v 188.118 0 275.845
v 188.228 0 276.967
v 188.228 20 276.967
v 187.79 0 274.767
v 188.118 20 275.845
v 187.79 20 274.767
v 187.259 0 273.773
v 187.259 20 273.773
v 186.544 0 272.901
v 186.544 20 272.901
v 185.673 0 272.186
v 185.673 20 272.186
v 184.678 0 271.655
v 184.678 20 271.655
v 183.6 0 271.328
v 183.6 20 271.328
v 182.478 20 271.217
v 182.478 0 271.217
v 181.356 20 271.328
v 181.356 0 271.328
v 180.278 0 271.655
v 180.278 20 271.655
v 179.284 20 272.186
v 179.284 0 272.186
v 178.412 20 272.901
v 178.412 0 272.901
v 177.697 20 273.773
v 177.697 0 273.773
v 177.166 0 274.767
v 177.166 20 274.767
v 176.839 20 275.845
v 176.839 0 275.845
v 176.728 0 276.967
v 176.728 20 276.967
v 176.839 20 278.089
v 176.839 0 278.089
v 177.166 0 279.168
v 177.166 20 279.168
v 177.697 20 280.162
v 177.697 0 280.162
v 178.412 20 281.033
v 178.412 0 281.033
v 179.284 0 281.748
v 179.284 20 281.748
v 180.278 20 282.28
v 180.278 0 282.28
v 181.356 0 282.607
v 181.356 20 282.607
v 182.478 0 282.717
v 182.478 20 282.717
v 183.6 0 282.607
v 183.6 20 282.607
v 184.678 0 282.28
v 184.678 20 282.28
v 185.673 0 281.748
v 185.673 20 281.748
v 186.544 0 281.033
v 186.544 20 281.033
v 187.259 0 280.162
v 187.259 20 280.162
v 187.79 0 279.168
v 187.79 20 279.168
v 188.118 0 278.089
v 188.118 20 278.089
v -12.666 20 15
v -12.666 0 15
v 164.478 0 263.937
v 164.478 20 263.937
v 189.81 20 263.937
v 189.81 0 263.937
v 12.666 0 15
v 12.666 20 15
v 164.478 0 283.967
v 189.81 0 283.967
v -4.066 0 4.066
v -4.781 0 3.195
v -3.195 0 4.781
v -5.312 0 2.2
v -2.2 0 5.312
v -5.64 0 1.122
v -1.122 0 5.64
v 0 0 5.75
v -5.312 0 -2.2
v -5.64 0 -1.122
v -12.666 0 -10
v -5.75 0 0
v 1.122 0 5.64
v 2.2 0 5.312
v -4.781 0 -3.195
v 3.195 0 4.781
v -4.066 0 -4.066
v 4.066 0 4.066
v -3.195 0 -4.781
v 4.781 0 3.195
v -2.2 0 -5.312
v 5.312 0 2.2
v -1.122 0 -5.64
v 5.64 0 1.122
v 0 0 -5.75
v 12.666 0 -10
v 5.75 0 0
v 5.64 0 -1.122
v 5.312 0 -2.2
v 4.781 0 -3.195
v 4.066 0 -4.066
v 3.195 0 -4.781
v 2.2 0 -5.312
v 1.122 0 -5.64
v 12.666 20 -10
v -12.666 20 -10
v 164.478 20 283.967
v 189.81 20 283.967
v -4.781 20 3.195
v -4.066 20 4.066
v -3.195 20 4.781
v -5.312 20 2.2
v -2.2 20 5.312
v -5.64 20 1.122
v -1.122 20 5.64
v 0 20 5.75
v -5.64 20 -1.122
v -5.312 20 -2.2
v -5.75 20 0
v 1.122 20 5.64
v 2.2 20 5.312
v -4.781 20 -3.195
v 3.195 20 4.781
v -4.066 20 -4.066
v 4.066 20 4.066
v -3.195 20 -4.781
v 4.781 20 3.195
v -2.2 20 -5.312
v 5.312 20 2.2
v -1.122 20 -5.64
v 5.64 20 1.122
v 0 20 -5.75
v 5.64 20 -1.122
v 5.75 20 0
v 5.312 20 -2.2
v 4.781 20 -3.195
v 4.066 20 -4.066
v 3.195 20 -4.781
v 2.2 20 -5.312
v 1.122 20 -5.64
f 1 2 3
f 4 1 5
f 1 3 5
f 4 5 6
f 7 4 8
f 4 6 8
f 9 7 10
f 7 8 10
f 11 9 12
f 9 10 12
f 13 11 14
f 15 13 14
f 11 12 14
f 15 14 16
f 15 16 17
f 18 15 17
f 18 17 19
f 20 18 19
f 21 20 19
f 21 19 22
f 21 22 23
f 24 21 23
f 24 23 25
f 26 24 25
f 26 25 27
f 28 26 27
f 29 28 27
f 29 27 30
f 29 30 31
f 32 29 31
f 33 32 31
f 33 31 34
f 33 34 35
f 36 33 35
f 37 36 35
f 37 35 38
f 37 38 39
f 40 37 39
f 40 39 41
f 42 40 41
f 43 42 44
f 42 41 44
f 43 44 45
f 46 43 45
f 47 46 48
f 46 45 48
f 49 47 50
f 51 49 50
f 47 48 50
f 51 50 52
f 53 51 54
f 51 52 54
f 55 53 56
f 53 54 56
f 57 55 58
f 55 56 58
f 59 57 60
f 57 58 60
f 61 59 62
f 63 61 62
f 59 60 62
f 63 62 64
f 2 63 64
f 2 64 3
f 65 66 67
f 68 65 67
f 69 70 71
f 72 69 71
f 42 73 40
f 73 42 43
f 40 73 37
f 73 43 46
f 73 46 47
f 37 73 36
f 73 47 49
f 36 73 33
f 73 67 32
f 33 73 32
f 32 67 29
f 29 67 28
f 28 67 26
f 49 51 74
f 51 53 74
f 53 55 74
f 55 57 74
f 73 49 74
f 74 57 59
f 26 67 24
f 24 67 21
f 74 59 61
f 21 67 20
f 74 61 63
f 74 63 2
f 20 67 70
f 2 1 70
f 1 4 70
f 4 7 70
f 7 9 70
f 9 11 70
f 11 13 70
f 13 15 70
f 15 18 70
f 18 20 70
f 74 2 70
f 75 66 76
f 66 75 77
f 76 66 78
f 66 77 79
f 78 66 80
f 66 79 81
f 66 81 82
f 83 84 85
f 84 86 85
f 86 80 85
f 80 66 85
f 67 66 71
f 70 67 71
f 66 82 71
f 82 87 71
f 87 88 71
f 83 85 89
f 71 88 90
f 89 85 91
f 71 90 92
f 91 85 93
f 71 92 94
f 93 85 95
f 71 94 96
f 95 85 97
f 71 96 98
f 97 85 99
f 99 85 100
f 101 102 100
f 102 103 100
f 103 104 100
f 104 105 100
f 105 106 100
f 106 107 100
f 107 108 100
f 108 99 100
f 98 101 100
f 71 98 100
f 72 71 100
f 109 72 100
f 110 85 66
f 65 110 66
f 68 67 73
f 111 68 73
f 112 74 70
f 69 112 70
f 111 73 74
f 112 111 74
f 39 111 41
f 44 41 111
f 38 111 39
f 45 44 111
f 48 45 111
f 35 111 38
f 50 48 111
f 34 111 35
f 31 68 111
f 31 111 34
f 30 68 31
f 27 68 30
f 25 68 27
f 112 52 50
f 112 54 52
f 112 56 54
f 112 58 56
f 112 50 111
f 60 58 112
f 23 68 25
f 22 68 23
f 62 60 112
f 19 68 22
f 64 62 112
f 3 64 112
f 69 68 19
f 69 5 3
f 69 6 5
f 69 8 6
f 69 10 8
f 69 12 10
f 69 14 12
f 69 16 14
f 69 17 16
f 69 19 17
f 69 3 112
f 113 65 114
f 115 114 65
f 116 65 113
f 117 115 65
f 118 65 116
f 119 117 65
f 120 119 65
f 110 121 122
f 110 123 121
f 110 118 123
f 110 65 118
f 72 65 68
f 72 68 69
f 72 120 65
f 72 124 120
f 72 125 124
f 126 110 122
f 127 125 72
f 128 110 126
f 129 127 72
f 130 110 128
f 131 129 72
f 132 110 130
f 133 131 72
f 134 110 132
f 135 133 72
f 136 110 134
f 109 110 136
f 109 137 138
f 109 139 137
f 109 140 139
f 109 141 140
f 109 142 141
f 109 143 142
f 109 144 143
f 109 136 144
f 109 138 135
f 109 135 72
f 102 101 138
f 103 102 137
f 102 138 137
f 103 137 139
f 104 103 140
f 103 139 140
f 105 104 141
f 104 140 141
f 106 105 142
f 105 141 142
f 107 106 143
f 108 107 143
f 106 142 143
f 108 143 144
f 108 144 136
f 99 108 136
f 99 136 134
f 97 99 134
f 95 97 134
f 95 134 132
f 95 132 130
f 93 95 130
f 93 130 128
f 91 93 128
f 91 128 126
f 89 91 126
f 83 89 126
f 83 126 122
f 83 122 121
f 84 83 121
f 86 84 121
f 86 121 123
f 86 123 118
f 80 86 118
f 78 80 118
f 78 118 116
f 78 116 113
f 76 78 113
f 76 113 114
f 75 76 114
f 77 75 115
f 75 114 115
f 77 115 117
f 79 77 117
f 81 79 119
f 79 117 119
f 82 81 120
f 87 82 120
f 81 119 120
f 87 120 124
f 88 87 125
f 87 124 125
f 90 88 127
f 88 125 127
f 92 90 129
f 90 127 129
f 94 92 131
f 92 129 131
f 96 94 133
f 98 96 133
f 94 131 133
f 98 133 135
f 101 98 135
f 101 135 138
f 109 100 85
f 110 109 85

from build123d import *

# Parameters (mm, degrees)
BOSS_EXTRUDE2_DEPTH = 20
SKETCH3_R           = 5.75
CUT_EXTRUDE1_DEPTH  = 21


with BuildPart() as part:
    # Sketch2 → Boss-Extrude2 (new body)
    with BuildSketch(Plane(origin=(0, 0, 0), x_dir=(1, 0, 0), z_dir=(0, 1, 0))):
        Polygon((-12.666179626, 10), (-12.666179626, -15), (164.478056179, -263.93698429), (164.478056179, -283.967221838), (189.810415431, -283.967221838), (189.810415431, -263.93698429), (12.666179626, -15), (12.666179626, 10), align=None)
    extrude(amount=BOSS_EXTRUDE2_DEPTH)

    # Sketch3 → Cut-Extrude1 (cut, through all)
    with BuildSketch(Plane(origin=(0, 20, 0), x_dir=(1, 0, 0), z_dir=(0, 1, 0))):
        Circle(SKETCH3_R)
        with Locations((182.478056179, -276.967221838)):
            Circle(SKETCH3_R)
    extrude(amount=-CUT_EXTRUDE1_DEPTH, mode=Mode.SUBTRACT)


solid = part.part
